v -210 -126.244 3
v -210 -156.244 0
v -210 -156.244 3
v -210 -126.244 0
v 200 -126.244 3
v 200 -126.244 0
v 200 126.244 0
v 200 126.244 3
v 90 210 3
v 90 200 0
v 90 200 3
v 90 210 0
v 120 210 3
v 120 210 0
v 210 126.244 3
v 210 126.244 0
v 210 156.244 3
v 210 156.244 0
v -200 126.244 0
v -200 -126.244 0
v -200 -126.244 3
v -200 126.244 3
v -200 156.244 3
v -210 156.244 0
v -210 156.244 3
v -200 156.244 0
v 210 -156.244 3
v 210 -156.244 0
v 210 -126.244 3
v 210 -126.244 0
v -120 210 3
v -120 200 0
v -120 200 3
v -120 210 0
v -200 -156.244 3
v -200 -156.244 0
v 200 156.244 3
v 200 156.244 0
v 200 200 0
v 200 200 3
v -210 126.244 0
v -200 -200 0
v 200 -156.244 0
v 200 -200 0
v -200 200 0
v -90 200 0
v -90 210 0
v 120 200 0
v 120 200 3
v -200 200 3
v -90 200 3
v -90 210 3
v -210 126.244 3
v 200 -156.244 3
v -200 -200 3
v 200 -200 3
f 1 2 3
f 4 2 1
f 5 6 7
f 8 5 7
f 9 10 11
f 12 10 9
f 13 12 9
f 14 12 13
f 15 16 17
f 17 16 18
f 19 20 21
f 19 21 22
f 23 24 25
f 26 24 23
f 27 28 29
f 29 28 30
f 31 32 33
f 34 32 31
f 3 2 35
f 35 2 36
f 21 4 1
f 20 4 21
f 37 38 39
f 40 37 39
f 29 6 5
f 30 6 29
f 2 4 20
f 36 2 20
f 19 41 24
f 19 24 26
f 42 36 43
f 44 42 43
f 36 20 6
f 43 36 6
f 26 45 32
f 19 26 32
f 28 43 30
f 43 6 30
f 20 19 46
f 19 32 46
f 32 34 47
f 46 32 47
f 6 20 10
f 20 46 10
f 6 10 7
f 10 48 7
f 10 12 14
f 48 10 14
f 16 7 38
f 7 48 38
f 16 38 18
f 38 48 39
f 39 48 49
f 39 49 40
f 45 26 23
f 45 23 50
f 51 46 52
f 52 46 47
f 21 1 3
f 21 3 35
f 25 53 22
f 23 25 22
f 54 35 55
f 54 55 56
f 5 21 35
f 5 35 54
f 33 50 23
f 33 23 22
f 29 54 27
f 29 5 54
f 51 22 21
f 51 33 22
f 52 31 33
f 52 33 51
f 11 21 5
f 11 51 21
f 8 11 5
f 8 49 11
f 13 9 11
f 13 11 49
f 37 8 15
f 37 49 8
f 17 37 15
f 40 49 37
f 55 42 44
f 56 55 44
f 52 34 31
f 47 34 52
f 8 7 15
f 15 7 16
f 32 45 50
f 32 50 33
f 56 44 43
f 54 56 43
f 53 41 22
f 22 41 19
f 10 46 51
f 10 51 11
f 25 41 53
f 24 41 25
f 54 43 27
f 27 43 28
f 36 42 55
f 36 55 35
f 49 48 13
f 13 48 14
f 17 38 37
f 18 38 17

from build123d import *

# Parameters (mm, degrees)
CROQUIS1_W              = 400
CROQUIS1_H              = 400
CROQUIS1_W_2            = 10
CROQUIS1_H_2            = 30
CROQUIS1_W_3            = 30
CROQUIS1_H_3            = 10
SALIENTE_EXTRUIR1_DEPTH = 3


with BuildPart() as part:
    # Croquis1 → Saliente-Extruir1 (new body)
    with BuildSketch(Plane.XY):
        Rectangle(CROQUIS1_W, CROQUIS1_H)
        with Locations((205, 141.243683163)):
            Rectangle(CROQUIS1_W_2, CROQUIS1_H_2)
        with Locations((205, -141.243683163)):
            Rectangle(CROQUIS1_W_2, CROQUIS1_H_2)
        with Locations((-205, -141.243683163)):
            Rectangle(CROQUIS1_W_2, CROQUIS1_H_2)
        with Locations((-205, 141.243683163)):
            Rectangle(CROQUIS1_W_2, CROQUIS1_H_2)
        with Locations((-105, 205)):
            Rectangle(CROQUIS1_W_3, CROQUIS1_H_3)
        with Locations((105, 205)):
            Rectangle(CROQUIS1_W_3, CROQUIS1_H_3)
    extrude(amount=SALIENTE_EXTRUIR1_DEPTH)


solid = part.part
